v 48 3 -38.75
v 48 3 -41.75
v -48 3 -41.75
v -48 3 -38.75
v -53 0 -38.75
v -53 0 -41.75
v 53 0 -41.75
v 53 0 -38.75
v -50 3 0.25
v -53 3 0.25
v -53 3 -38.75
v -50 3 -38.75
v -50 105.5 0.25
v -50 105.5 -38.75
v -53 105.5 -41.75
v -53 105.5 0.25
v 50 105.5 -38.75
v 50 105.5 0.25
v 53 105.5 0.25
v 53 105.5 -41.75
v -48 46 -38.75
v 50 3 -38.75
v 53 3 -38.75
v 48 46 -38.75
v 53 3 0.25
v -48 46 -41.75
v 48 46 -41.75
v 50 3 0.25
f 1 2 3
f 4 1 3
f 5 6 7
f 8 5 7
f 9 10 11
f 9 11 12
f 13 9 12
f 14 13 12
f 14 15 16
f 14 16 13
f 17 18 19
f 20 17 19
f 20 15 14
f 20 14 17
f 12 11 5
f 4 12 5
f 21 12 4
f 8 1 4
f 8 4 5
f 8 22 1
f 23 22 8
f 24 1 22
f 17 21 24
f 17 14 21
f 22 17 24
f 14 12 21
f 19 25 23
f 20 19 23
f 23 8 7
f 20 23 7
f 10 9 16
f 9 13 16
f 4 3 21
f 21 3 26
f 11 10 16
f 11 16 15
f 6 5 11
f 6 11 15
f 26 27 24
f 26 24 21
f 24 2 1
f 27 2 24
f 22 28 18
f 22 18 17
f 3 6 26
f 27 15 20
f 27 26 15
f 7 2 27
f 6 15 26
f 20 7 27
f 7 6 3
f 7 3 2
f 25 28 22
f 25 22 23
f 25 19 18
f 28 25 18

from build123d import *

# Parameters (mm, degrees)
SKETCH1_W                = 100
SKETCH1_H                = 77.5
BOSS_EXTRUDE1_DEPTH      = 3
BOSS_EXTRUDE2_DEPTH      = 102.5
BOSS_EXTRUDE2_DEPTH_BACK = 3
SKETCH2_W                = 106
SKETCH2_H                = 83.5
SKETCH2_W_2              = 100
SKETCH2_H_2              = 77.5
SKETCH3_W                = 106
SKETCH3_H                = 105.5
CUT_EXTRUDE1_DEPTH       = 41.5
CUT_EXTRUDE3_REACH       = 127.313
SKETCH6_W                = 96
SKETCH6_H                = 43
SKETCH7_W                = 106
SKETCH7_H                = 3
CUT_EXTRUDE4_DEPTH       = 39


with BuildPart() as part:
    # Sketch1 → Boss-Extrude1 (new body)
    with BuildSketch(Plane(origin=(0, 0, 0), x_dir=(1, 0, 0), z_dir=(0, 1, 0))):
        Rectangle(SKETCH1_W, SKETCH1_H)
    extrude(amount=BOSS_EXTRUDE1_DEPTH)

    # Sketch2 → Boss-Extrude2 (add, two sides: drawn at the far end of the back side and taken through both)
    with BuildSketch(Plane(origin=(0, 3, 0), x_dir=(1, 0, 0), z_dir=(0, 1, 0)).offset(-BOSS_EXTRUDE2_DEPTH_BACK)):
        Rectangle(SKETCH2_W, SKETCH2_H)
        Rectangle(SKETCH2_W_2, SKETCH2_H_2, mode=Mode.SUBTRACT)
    extrude(amount=BOSS_EXTRUDE2_DEPTH + BOSS_EXTRUDE2_DEPTH_BACK)

    # Sketch3 → Cut-Extrude1 (cut)
    with BuildSketch(Plane(origin=(0, 0, 41.75), x_dir=(-1, 0, 0), z_dir=(0, 0, -1))):
        with Locations((0, 52.75)):
            Rectangle(SKETCH3_W, SKETCH3_H)
    extrude(amount=CUT_EXTRUDE1_DEPTH, mode=Mode.SUBTRACT)

    # Sketch6 → Cut-Extrude3 (cut, up to next)
    with BuildSketch(Plane(origin=(0, 0, -41.75), x_dir=(-1, 0, 0), z_dir=(0, 0, -1)), mode=Mode.PRIVATE) as cut_extrude3_sk1:
        with Locations((0, 24.5)):
            Rectangle(SKETCH6_W, SKETCH6_H)
    cut_extrude3_tool1 = extrude(cut_extrude3_sk1.sketch, amount=-CUT_EXTRUDE3_REACH, mode=Mode.PRIVATE) & part.part
    add(cut_extrude3_tool1.solids().sort_by_distance((0, 24.5, -41.75))[0], mode=Mode.SUBTRACT)

    # Sketch7 → Cut-Extrude4 (cut)
    with BuildSketch(Plane.XY.offset(0.25)):
        with Locations((0, 1.5)):
            Rectangle(SKETCH7_W, SKETCH7_H)
    extrude(amount=-CUT_EXTRUDE4_DEPTH, mode=Mode.SUBTRACT)


solid = part.part
